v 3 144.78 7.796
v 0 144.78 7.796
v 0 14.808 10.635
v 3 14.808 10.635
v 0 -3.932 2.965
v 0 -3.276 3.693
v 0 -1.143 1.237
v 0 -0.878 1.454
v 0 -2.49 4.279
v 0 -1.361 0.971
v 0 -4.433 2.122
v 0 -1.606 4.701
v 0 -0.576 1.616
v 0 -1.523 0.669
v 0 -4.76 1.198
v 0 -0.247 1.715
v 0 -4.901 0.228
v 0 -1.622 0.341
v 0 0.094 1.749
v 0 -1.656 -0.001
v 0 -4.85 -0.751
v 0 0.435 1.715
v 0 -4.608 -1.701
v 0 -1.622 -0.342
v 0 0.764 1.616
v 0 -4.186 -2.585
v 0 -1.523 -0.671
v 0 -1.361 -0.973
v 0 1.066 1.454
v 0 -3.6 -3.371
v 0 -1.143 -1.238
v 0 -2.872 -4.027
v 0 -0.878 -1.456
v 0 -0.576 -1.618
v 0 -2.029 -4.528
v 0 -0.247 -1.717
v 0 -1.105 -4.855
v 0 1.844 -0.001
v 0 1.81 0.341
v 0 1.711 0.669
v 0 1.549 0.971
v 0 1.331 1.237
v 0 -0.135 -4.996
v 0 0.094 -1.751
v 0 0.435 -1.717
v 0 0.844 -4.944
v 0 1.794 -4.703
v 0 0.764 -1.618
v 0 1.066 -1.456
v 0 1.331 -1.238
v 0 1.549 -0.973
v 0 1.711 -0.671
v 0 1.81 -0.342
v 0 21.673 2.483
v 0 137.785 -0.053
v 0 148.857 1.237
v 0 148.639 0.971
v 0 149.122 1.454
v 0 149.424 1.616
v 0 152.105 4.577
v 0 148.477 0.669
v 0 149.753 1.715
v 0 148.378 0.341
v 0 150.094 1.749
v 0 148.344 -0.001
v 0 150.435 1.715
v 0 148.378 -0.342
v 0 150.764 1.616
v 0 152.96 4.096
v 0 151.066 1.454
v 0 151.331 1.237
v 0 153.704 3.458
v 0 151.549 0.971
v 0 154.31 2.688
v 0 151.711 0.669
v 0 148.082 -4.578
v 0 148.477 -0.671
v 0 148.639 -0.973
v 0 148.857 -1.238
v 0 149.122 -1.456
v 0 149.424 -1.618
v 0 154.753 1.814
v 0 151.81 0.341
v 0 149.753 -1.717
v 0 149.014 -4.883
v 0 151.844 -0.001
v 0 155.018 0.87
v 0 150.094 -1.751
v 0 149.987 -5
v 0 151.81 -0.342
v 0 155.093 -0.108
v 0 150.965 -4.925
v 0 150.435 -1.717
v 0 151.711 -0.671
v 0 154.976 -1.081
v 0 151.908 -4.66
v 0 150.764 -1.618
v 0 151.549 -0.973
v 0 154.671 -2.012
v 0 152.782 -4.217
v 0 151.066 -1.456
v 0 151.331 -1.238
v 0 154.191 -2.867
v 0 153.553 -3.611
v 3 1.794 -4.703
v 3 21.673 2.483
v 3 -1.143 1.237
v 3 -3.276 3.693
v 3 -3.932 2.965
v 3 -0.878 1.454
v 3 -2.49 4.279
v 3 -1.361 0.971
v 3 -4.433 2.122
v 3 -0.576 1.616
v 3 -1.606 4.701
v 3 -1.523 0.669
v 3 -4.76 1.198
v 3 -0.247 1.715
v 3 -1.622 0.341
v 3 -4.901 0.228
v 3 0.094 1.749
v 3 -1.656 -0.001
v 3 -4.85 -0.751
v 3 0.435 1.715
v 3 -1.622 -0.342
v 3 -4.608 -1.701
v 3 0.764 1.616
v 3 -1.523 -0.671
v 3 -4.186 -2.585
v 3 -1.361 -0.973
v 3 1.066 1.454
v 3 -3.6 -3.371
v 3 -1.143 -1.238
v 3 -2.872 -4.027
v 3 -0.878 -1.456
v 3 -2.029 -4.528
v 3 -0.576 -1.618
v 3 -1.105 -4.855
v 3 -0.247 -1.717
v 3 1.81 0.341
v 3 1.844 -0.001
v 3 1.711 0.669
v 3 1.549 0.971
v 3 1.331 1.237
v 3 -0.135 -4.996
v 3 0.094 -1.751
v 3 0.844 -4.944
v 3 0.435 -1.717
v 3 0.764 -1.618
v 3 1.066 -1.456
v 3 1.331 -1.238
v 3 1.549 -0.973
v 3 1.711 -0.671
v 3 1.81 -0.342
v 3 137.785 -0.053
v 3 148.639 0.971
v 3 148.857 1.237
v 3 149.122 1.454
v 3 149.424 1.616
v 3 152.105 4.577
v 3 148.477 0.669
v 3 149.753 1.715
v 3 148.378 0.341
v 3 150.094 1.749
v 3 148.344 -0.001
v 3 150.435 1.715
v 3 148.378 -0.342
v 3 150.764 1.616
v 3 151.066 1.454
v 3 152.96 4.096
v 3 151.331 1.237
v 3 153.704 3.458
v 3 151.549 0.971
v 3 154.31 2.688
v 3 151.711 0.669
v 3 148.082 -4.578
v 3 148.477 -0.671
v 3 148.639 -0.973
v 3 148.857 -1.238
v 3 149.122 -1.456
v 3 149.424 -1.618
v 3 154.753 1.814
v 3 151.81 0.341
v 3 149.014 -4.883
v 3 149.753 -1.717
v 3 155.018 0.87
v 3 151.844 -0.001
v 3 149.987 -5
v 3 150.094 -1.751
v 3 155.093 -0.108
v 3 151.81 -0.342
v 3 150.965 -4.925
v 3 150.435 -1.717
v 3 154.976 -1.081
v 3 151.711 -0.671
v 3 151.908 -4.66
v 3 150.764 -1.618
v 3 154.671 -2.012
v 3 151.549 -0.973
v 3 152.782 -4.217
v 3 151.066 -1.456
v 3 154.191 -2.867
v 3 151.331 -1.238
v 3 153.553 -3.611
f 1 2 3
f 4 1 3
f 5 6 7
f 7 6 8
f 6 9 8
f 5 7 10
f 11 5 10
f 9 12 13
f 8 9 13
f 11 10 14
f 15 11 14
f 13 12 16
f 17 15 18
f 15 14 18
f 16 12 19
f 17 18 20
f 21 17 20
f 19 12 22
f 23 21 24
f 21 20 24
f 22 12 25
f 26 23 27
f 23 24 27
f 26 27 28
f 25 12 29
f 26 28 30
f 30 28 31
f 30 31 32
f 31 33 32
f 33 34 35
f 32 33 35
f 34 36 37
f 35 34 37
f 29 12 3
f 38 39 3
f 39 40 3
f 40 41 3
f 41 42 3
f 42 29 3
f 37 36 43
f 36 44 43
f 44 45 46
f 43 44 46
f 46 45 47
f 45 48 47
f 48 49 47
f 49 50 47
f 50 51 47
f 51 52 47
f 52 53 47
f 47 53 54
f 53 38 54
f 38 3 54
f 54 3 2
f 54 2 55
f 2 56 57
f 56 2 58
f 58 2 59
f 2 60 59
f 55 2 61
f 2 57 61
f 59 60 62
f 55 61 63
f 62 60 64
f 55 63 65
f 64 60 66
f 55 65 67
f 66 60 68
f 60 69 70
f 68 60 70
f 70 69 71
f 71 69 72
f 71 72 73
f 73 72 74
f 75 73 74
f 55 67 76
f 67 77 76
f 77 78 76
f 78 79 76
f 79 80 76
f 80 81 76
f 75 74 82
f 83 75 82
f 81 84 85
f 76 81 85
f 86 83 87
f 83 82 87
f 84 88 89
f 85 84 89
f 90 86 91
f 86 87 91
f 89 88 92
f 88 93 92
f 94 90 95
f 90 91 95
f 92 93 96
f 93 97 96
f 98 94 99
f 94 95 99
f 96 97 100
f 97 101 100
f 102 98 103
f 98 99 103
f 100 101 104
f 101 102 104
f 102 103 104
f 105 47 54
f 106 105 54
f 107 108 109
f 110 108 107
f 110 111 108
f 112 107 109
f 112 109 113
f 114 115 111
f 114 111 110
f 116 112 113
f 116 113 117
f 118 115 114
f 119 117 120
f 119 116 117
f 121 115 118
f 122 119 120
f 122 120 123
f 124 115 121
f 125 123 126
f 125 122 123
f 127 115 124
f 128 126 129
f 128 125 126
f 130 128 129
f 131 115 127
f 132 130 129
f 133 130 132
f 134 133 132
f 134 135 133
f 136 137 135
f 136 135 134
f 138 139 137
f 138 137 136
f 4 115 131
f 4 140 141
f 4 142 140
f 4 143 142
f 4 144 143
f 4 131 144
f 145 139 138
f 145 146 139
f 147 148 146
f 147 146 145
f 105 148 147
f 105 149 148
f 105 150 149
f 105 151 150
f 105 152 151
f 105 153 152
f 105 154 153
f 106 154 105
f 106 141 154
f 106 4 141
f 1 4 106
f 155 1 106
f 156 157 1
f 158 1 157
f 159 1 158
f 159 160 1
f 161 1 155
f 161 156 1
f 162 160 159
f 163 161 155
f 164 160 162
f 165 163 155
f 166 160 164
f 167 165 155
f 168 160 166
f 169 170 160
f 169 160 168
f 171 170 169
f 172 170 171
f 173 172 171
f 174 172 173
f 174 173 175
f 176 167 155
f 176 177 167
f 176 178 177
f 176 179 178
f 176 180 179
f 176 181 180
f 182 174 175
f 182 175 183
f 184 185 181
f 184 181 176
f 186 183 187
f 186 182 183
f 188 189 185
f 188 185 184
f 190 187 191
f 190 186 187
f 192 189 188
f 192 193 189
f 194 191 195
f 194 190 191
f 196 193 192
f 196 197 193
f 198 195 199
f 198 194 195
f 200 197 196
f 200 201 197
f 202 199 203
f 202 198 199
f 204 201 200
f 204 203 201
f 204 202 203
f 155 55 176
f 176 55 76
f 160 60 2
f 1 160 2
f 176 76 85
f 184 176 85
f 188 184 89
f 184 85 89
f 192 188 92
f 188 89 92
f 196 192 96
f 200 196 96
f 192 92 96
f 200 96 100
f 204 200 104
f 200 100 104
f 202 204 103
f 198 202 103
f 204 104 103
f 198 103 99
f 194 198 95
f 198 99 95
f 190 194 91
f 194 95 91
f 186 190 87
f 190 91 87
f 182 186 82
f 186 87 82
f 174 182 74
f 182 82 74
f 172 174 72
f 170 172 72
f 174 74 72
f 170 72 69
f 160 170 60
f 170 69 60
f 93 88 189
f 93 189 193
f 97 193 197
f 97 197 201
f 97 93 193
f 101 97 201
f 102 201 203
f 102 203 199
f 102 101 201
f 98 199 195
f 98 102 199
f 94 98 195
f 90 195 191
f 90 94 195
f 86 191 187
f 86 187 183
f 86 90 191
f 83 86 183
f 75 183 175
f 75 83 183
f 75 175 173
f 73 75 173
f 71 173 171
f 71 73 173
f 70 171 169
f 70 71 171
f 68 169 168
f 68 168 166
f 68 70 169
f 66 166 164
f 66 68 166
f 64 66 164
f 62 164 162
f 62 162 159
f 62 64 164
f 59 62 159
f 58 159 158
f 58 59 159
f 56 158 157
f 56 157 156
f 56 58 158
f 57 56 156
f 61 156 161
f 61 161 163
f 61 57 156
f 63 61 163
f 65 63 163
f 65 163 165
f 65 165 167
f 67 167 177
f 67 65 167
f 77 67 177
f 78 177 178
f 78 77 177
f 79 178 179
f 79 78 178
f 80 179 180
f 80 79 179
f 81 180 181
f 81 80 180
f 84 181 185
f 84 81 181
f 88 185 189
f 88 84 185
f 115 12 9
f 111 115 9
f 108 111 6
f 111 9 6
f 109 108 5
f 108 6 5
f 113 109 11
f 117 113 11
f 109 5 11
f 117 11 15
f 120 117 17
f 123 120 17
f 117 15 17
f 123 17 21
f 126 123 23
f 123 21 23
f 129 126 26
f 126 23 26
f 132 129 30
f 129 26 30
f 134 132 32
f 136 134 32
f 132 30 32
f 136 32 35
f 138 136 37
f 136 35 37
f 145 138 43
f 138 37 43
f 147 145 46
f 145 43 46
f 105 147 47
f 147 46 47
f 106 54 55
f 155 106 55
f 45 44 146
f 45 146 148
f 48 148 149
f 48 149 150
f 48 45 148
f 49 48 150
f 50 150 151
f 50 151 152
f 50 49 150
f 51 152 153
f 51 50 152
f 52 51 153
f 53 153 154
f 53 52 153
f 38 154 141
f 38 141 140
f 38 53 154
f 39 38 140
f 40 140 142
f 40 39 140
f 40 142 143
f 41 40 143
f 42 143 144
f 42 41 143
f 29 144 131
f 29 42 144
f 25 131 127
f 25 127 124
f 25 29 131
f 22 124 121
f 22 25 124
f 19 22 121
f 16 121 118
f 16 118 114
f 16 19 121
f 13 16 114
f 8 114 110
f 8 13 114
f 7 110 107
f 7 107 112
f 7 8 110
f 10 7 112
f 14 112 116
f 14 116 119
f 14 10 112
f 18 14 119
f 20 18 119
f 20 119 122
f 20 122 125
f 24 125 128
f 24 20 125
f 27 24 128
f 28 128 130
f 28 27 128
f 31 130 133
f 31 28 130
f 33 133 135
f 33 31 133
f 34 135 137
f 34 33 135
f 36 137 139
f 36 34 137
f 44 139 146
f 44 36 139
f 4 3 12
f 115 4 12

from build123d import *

# Parameters (mm, degrees)
CROQUIS1_R              = 1.75
SALIENTE_EXTRUIR1_DEPTH = 3


with BuildPart() as part:
    # Croquis1 → Saliente-Extruir1 (new body)
    with BuildSketch(Plane(origin=(0, 0, 0), x_dir=(0, 0, -1), z_dir=(1, 0, 0))):
        with BuildLine():
            Line((4.703111933, 1.793661764), (-2.482700505, 21.6730463))
            Line((-2.482700505, 21.6730463), (0.053198949, 137.784671118))
            Line((0.053198949, 137.784671118), (4.5784072, 148.082410318))
            ThreePointArc((4.5784072, 148.082410318), (2.012416575, 154.671468833), (-4.57664194, 152.105478208))
            Line((-4.57664194, 152.105478208), (-7.795940026, 144.779518768))
            Line((-7.795940026, 144.779518768), (-10.634536468, 14.808259621))
            Line((-10.634536468, 14.808259621), (-4.701346672, -1.605773238))
            ThreePointArc((-4.701346672, -1.605773238), (1.700600132, -4.60828504), (4.703111933, 1.793661764))
        make_face()
        with Locations((0.00088263, 150.093944263)):
            Circle(CROQUIS1_R, mode=Mode.SUBTRACT)
        with Locations((0.00088263, 0.093944263)):
            Circle(CROQUIS1_R, mode=Mode.SUBTRACT)
    extrude(amount=SALIENTE_EXTRUIR1_DEPTH)


solid = part.part
